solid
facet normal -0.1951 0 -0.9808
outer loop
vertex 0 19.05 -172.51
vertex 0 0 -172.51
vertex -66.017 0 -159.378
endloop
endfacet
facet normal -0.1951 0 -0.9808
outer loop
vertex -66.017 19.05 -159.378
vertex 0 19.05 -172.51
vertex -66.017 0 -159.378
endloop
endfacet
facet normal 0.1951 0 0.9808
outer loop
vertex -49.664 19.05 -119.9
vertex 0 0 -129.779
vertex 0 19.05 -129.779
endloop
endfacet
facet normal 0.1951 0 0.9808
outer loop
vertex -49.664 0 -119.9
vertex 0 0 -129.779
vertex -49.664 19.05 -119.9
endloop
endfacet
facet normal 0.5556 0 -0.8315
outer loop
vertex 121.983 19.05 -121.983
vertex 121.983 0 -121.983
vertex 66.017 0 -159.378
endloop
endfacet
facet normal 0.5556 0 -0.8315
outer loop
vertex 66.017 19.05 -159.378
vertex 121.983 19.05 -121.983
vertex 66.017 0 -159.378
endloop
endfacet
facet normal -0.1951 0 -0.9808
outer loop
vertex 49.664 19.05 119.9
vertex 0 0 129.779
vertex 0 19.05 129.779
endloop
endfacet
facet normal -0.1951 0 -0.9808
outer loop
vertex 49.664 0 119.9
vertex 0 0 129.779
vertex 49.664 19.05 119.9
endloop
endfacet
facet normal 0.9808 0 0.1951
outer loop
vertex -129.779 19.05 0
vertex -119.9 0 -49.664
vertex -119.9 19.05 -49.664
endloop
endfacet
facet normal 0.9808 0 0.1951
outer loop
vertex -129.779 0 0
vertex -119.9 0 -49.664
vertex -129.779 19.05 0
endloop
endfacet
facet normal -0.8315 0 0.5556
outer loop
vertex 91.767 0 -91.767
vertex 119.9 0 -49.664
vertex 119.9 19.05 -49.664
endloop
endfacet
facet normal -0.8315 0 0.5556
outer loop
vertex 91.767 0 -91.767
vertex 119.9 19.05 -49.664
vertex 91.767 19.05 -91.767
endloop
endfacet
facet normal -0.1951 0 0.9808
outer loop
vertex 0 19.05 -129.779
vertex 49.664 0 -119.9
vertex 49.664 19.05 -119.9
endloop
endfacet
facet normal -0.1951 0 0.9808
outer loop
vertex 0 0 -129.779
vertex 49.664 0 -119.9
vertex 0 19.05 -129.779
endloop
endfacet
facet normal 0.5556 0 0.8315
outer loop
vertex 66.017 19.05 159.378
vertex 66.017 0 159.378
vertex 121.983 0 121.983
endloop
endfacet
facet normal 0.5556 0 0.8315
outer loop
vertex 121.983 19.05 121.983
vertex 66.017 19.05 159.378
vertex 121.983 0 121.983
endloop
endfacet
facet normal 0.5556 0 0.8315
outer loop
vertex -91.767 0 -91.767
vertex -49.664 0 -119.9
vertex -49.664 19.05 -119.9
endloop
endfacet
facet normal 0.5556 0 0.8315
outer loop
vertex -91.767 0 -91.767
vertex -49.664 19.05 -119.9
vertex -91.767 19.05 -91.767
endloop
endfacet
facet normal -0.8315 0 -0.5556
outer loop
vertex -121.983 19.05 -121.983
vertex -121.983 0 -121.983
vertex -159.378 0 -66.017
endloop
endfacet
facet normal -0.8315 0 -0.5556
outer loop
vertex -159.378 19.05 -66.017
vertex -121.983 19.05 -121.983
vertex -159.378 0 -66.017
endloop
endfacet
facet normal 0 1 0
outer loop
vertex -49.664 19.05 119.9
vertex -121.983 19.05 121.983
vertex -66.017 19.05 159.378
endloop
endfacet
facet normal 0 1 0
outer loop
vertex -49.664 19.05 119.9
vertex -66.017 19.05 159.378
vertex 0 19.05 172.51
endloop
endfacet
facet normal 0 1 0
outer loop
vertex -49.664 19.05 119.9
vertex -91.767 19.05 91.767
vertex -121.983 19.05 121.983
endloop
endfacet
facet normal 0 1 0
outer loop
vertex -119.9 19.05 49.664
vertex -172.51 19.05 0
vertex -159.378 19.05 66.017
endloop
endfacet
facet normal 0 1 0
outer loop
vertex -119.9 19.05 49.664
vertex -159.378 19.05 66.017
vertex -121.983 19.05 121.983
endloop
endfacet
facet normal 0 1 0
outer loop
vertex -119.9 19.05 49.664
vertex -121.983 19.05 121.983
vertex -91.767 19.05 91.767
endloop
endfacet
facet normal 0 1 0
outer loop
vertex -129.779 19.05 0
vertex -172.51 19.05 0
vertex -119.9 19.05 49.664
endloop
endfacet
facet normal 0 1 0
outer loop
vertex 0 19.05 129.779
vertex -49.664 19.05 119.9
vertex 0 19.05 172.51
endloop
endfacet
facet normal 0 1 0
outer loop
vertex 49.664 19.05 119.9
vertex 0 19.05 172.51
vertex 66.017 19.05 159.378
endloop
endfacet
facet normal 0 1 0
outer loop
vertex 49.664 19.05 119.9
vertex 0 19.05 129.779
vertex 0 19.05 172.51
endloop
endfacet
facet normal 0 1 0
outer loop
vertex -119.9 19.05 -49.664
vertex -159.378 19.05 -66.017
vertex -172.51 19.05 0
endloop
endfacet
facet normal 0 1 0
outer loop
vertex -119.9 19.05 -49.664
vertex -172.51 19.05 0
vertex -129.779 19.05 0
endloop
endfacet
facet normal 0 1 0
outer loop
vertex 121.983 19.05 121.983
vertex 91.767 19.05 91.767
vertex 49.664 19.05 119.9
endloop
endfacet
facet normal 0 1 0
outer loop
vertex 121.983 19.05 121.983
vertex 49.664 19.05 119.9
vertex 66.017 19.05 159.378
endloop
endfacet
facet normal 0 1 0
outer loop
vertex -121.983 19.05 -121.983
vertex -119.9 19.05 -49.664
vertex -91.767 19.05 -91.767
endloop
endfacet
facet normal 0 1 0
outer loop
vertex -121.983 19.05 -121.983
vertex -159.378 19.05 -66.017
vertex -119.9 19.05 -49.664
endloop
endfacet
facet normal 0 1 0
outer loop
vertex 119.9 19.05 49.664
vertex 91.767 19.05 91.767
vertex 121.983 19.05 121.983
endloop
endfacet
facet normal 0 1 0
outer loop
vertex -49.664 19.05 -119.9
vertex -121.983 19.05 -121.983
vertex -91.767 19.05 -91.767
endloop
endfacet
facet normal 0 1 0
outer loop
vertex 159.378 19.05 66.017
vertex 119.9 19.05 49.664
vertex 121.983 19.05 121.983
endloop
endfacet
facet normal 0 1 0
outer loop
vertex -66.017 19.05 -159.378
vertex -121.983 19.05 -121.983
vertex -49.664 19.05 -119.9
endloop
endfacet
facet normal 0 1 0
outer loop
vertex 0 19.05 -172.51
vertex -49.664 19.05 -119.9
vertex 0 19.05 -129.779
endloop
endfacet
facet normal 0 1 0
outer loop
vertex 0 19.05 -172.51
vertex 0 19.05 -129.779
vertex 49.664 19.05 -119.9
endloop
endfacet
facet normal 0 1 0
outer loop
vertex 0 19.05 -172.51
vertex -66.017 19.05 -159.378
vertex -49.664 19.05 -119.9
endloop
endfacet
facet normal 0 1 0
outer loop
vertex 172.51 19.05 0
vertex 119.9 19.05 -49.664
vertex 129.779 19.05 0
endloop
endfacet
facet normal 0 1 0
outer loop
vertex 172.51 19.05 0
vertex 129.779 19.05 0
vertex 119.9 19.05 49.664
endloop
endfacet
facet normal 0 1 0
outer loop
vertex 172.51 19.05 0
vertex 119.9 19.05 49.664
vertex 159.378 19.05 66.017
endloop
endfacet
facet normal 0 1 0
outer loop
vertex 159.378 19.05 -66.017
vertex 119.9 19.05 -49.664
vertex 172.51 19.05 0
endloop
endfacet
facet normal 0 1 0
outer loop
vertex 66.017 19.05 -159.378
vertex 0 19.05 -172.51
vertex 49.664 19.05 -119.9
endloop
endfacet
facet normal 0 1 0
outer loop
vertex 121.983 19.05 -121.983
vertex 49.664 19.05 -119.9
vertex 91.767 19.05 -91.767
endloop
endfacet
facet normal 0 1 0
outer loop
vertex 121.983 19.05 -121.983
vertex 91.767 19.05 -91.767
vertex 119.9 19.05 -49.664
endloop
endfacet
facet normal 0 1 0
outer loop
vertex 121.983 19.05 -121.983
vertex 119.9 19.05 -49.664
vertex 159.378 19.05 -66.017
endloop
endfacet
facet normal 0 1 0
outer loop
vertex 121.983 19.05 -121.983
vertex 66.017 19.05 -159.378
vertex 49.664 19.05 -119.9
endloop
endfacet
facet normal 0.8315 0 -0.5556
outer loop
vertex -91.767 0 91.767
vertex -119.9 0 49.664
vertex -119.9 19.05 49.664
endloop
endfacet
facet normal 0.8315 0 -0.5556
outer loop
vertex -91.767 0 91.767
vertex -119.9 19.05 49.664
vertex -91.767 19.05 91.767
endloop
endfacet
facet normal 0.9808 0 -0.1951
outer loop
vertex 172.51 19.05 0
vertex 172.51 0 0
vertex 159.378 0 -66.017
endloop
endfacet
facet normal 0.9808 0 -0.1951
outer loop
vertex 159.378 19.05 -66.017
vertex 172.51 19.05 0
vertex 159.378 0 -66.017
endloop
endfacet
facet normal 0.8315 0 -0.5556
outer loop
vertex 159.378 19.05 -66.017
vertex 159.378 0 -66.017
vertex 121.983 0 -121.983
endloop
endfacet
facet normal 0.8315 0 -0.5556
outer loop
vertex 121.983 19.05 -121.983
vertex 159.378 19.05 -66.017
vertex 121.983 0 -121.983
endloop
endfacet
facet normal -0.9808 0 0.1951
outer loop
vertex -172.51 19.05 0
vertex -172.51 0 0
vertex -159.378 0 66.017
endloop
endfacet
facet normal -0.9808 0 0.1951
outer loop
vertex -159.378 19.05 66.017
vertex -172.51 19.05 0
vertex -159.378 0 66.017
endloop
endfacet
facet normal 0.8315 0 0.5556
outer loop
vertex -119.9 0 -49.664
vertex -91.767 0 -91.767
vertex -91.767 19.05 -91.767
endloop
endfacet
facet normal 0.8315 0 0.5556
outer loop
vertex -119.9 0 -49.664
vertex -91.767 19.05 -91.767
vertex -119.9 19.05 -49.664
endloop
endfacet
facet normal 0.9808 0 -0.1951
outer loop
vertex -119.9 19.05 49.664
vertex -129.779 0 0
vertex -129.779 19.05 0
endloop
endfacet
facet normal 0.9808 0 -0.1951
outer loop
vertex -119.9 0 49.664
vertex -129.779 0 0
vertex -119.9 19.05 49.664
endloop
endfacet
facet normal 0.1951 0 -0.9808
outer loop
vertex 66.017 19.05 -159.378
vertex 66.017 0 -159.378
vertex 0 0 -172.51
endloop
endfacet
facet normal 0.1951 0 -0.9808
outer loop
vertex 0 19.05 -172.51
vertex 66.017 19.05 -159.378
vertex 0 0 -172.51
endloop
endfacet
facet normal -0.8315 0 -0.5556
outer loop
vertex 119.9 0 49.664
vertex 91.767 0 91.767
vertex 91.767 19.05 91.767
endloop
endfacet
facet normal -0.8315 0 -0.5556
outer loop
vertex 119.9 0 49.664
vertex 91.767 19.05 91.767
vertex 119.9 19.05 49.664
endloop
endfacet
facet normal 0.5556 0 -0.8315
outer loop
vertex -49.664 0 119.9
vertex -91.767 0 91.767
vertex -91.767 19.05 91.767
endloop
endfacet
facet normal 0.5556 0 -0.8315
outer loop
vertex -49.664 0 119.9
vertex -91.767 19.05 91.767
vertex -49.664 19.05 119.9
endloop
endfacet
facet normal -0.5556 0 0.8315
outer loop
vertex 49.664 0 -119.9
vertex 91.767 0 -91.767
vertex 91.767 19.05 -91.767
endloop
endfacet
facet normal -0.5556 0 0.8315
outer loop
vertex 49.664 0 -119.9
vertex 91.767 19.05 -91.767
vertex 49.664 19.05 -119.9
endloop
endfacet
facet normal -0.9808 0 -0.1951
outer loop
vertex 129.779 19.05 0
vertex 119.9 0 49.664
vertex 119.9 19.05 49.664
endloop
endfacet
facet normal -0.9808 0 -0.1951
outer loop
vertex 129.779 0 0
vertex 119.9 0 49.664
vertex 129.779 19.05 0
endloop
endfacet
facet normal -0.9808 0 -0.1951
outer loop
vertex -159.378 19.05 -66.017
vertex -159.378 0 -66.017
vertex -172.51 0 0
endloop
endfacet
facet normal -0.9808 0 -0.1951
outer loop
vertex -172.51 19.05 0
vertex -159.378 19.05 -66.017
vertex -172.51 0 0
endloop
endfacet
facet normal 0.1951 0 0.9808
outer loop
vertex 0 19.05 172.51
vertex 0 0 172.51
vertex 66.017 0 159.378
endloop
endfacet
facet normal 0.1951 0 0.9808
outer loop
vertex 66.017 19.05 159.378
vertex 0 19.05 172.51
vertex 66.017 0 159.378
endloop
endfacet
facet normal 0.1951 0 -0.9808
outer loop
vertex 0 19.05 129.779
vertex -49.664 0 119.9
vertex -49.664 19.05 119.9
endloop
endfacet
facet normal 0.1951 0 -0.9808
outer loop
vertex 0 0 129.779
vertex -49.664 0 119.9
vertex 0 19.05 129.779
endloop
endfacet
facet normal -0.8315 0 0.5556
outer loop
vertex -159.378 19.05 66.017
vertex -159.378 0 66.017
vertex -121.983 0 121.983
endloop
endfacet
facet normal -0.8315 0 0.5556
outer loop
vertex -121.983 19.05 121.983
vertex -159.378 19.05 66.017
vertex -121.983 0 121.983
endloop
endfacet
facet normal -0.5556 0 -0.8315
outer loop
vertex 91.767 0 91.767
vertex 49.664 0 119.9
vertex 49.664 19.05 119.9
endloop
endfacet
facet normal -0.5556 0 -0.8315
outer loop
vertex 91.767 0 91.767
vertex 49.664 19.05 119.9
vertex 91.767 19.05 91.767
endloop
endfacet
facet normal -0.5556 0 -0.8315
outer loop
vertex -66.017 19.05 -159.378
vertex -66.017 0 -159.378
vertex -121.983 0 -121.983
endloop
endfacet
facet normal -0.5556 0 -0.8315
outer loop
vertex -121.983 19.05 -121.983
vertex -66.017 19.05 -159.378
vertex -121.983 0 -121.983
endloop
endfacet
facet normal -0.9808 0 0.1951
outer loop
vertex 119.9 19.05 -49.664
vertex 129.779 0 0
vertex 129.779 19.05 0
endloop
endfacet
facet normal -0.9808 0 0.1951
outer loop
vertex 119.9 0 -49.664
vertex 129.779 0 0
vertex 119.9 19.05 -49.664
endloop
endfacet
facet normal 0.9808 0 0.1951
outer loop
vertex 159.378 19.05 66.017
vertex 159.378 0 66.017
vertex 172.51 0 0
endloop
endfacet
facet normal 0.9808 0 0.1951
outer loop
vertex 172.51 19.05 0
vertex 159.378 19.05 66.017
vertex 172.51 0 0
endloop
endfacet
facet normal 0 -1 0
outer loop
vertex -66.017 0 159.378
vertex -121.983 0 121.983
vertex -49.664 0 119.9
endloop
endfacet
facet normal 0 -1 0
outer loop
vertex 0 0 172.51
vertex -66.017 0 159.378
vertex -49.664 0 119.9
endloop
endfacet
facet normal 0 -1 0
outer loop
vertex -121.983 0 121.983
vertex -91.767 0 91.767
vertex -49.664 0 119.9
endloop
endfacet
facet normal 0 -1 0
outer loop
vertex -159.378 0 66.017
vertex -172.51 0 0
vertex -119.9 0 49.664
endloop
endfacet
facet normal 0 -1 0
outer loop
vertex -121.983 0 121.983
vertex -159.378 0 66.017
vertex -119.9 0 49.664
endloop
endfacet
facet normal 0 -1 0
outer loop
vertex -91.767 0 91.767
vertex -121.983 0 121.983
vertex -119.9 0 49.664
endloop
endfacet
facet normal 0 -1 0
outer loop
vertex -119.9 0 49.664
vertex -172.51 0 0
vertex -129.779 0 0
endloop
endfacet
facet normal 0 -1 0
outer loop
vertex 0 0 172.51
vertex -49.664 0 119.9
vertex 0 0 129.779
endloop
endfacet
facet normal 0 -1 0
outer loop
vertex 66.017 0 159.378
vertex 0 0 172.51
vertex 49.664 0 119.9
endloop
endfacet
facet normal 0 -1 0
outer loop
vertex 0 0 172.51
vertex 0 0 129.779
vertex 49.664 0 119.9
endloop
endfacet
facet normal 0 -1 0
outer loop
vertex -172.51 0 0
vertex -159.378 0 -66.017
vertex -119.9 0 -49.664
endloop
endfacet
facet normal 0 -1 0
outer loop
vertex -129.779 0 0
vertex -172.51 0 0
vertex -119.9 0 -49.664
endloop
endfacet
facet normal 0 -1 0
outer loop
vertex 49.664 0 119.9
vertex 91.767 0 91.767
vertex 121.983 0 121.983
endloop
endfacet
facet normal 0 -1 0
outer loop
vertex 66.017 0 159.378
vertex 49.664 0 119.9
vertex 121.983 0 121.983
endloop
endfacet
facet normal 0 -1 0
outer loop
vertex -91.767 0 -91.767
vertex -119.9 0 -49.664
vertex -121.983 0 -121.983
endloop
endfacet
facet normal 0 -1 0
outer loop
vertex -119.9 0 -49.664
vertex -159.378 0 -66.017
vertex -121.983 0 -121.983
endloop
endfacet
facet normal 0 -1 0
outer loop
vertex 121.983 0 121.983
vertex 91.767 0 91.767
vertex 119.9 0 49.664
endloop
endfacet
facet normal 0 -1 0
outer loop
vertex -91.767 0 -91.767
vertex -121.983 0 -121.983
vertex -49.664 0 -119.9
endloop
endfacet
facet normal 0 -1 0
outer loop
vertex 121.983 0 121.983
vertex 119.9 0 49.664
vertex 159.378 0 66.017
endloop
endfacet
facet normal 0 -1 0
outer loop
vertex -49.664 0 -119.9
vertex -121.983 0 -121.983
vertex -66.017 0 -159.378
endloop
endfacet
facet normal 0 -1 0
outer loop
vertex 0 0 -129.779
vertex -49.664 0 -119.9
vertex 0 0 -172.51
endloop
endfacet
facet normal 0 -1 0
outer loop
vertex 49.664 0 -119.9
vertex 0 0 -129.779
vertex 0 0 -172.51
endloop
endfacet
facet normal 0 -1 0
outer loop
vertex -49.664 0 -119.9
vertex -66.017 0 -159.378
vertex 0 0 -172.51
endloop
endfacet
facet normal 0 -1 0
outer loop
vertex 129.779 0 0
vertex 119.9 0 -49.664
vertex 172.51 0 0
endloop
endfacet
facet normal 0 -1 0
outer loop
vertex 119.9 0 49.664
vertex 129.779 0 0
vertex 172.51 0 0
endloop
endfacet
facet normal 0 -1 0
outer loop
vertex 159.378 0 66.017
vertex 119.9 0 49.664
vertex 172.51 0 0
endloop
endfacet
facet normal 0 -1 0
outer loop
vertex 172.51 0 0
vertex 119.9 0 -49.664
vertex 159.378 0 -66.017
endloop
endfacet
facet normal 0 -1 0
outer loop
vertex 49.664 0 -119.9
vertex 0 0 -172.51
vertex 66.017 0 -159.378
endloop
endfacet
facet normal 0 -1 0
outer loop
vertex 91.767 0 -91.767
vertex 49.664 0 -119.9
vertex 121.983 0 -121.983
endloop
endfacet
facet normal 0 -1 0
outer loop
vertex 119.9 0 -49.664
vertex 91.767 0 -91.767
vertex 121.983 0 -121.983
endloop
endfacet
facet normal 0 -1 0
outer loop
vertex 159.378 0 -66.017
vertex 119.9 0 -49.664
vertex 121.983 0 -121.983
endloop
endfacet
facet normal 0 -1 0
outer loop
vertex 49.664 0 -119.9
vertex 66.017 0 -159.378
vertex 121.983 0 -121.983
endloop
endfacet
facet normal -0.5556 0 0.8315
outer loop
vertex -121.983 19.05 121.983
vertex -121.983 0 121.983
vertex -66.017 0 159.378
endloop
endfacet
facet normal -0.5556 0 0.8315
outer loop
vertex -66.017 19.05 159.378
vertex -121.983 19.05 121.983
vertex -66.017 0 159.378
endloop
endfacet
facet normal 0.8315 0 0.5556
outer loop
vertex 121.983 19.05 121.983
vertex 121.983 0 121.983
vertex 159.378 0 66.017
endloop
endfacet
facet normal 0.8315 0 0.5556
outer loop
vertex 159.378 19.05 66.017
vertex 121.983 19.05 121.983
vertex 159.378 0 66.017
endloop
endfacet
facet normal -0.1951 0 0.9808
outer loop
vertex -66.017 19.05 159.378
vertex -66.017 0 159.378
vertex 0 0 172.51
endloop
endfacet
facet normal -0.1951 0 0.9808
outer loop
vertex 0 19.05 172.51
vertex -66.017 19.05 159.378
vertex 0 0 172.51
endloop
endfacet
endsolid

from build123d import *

# Parameters (mm, degrees)
BOSS_EXTRUDE1_DEPTH = 19.05


with BuildPart() as part:
    # Sketch1 → Boss-Extrude1 (new body)
    with BuildSketch(Plane(origin=(0, 0, 0), x_dir=(1, 0, 0), z_dir=(0, 1, 0))):
        Polygon((172.509838787, 0), (159.378309213, 66.016657224), (121.982876828, 121.982876828), (66.016657224, 159.378309213), (0, 172.509838787), (-66.016657224, 159.378309213), (-121.982876828, 121.982876828), (-159.378309213, 66.016657224), (-172.509838787, 0), (-159.378309213, -66.016657224), (-121.982876828, -121.982876828), (-66.016657224, -159.378309213), (0, -172.509838787), (66.016657224, -159.378309213), (121.982876828, -121.982876828), (159.378309213, -66.016657224), align=None)
        Polygon((129.778773347, 0), (119.89995245, 49.664186433), (91.767450688, 91.767450688), (49.664186433, 119.89995245), (0, 129.778773347), (-49.664186433, 119.89995245), (-91.767450688, 91.767450688), (-119.89995245, 49.664186433), (-129.778773347, 0), (-119.89995245, -49.664186433), (-91.767450688, -91.767450688), (-49.664186433, -119.89995245), (0, -129.778773347), (49.664186433, -119.89995245), (91.767450688, -91.767450688), (119.89995245, -49.664186433), align=None, mode=Mode.SUBTRACT)
    extrude(amount=BOSS_EXTRUDE1_DEPTH)


solid = part.part
